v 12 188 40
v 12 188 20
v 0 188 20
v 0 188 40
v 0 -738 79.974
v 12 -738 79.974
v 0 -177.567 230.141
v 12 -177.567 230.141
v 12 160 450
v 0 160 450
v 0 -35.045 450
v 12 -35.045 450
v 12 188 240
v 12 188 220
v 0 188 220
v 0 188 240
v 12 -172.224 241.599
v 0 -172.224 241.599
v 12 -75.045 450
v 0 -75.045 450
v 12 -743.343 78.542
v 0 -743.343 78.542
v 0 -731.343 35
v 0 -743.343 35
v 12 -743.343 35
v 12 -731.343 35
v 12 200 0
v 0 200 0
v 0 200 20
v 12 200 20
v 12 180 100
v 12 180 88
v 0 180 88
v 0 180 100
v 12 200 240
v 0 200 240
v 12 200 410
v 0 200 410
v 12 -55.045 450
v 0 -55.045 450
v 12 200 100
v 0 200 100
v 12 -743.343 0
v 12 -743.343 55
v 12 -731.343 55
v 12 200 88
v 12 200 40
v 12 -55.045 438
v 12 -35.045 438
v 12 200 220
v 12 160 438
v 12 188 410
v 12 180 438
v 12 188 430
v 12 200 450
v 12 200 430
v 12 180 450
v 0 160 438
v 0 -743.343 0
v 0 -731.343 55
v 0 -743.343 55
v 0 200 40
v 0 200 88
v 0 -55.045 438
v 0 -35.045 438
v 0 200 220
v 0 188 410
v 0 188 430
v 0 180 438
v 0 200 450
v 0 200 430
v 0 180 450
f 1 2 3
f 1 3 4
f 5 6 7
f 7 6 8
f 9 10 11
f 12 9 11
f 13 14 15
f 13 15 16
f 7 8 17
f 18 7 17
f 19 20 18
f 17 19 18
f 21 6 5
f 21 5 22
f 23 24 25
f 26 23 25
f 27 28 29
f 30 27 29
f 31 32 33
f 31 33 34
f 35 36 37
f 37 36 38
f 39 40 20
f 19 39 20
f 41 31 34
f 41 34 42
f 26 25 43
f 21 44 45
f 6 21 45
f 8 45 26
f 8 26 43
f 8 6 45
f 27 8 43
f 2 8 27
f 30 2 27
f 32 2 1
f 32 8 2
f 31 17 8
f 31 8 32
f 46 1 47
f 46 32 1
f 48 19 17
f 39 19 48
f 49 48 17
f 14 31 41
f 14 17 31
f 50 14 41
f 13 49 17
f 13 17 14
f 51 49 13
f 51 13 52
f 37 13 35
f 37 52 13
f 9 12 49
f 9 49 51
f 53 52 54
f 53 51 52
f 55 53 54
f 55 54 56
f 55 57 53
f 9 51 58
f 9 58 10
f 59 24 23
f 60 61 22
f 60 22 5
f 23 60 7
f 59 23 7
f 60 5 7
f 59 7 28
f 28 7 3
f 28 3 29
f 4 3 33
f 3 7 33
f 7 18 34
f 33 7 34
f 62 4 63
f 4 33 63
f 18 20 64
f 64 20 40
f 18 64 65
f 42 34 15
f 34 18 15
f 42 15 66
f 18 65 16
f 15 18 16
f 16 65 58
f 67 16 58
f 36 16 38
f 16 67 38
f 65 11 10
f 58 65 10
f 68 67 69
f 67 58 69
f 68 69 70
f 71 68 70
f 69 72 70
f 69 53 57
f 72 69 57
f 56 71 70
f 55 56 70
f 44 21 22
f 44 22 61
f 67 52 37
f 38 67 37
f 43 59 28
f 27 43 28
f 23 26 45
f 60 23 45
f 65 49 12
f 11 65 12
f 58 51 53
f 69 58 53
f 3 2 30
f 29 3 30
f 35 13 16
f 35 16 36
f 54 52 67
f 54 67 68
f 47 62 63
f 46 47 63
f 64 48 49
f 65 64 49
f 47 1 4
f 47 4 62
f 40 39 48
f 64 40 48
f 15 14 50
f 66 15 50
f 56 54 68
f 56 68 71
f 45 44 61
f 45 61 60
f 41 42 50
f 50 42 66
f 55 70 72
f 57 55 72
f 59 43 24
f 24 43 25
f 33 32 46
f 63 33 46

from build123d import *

# Parameters (mm, degrees)
F0_W      = 200
F0_H      = 460
F1_DEPTH  = 12
F2_W      = 12
F2_H      = 20
F2_W_2    = 20
F2_H_2    = 22
F3_DEPTH  = 25
F4_DEPTH  = 10
F6_W      = 12
F6_H      = 20
F7_DEPTH  = 12
F8_W      = 20
F8_H      = 12
F9_DEPTH  = 25
F11_DEPTH = 25
F12_W     = 5.3429044291
F12_H     = 20
F12_H_2   = 35
F13_DEPTH = 12


# Not quite as in the source:
# - a feature of the source that left no trace in its solid (it failed there, or was rolled back) is left out
# - a feature names something its author has since deleted; it is built from what else it names


with BuildPart() as f1:
    # F0 (on Right) → F1 (new body)
    with BuildSketch(Plane.YZ):
        Polygon((-738, 0), (0, 0), (0, 460), (-70.3818810435, 460), (-172.2238128496, 241.5992724437), (-738, 90), align=None)
        with Locations((100, 230)):
            Rectangle(F0_W, F0_H)
    extrude(amount=F1_DEPTH)

    # F2 (on face) → F3 (cut)
    with BuildSketch(Plane.YZ.offset(12)):
        with Locations((194, 30)):
            Rectangle(F2_W, F2_H)
        with Locations((194, 230)):
            Rectangle(F2_W, F2_H)
        with Locations((194, 420)):
            Rectangle(F2_W, F2_H)
        with Locations((170, 449)):
            Rectangle(F2_W_2, F2_H_2)
        Polygon((-35.0449576251, 460), (-55.0449576251, 460), (-55.0449576251, 450), (-55.0449576251, 438), (-35.0449576251, 438), align=None)
    extrude(amount=-F3_DEPTH, mode=Mode.SUBTRACT)

    # F4 (cut): faces of the model
    f4_faces = [f1.faces().sort_by_distance(p)[0] for p in [
        (6, -62.7134193343, 460),
        (6, 62.4775211875, 460),
        (6, 190, 460),
    ]]
    extrude(f4_faces, amount=-F4_DEPTH, mode=Mode.SUBTRACT)

    # F6 (on face) → F7 (cut)
    with BuildSketch(Plane.XZ.offset(738)):
        with Locations((6, 45)):
            Rectangle(F6_W, F6_H)
    extrude(amount=-F7_DEPTH, mode=Mode.SUBTRACT)

    # F8 (on face) → F9 (cut)
    with BuildSketch(Plane.YZ.offset(12)):
        with Locations((190, 94)):
            Rectangle(F8_W, F8_H)
        Polygon((-70.3818810435, 460), (-75.0449576251, 450), (-70.3818810435, 450), align=None)
    extrude(amount=-F9_DEPTH, mode=Mode.SUBTRACT)

    # F10 (on face) → F11 (cut)
    with BuildSketch(Plane.YZ.offset(12)):
        Polygon((-177.5667172787, 230.14137692), (-172.2238128496, 241.5992724437), (-738, 90), (-738, 79.9737314033), align=None)
    extrude(amount=-F11_DEPTH, mode=Mode.SUBTRACT)

    # F12 (on face) → F13 (join)
    with BuildSketch(Plane.YZ.offset(12)):
        Polygon((-738, 55), (-738, 79.9737314033), (-743.3429044291, 78.5421044763), (-743.3429044291, 55), align=None)
        with Locations((-728.6714522145, 45)):
            Rectangle(F12_W, F12_H)
        with Locations((-740.6714522145, 17.5)):
            Rectangle(F12_W, F12_H_2)
    extrude(amount=-F13_DEPTH)


solid = f1.part
